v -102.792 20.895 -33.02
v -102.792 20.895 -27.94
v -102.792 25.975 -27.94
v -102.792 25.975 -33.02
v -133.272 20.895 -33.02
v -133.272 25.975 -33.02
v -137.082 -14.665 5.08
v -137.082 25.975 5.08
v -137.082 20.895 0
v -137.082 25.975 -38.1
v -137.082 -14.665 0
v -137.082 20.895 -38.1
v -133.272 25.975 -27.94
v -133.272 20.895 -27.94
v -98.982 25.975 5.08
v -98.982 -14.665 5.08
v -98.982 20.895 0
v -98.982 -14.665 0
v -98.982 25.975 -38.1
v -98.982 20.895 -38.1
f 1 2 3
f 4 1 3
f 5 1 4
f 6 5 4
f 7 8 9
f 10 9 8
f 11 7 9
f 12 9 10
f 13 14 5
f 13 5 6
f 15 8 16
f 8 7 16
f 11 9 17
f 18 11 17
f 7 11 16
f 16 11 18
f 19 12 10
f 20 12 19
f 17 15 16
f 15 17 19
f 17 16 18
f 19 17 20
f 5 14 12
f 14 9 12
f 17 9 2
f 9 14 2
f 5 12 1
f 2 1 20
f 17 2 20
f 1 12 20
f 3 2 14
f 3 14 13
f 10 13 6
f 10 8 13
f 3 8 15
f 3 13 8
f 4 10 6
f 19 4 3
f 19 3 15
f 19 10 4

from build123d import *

# Parameters (mm, degrees)
SKETCH1_W           = 38.1
SKETCH1_H           = 35.56
BOSS_EXTRUDE1_DEPTH = 5.08
SKETCH2_W           = 38.1
SKETCH2_H           = 43.18
BOSS_EXTRUDE2_DEPTH = 5.08
CAVITY2_START       = -133.272192899
CAVITY2_OUTLINE_W   = 5.08
CAVITY2_OUTLINE_H   = 5.08
CAVITY2_DEPTH       = 30.48


# Read off the part's stored shape, not the designer's step: Cavity2
with BuildPart() as part:
    # Sketch1 → Boss-Extrude1 (new body)
    with BuildSketch(Plane.XY):
        with Locations((-118.032192899, 3.115408086)):
            Rectangle(SKETCH1_W, SKETCH1_H)
    extrude(amount=BOSS_EXTRUDE1_DEPTH)

    # Sketch2 → Boss-Extrude2 (add)
    with BuildSketch(Plane(origin=(0, 20.895408086, 0), x_dir=(1, 0, 0), z_dir=(0, 1, 0))):
        with Locations((-118.032192899, 16.51)):
            Rectangle(SKETCH2_W, SKETCH2_H)
    extrude(amount=BOSS_EXTRUDE2_DEPTH)

    # Cavity2 outline → Cavity2 (cut)
    with BuildSketch(Plane.YZ.offset(CAVITY2_START)):
        with Locations((23.435408086, -30.48)):
            Rectangle(CAVITY2_OUTLINE_W, CAVITY2_OUTLINE_H)
    extrude(amount=CAVITY2_DEPTH, mode=Mode.SUBTRACT)


solid = part.part
